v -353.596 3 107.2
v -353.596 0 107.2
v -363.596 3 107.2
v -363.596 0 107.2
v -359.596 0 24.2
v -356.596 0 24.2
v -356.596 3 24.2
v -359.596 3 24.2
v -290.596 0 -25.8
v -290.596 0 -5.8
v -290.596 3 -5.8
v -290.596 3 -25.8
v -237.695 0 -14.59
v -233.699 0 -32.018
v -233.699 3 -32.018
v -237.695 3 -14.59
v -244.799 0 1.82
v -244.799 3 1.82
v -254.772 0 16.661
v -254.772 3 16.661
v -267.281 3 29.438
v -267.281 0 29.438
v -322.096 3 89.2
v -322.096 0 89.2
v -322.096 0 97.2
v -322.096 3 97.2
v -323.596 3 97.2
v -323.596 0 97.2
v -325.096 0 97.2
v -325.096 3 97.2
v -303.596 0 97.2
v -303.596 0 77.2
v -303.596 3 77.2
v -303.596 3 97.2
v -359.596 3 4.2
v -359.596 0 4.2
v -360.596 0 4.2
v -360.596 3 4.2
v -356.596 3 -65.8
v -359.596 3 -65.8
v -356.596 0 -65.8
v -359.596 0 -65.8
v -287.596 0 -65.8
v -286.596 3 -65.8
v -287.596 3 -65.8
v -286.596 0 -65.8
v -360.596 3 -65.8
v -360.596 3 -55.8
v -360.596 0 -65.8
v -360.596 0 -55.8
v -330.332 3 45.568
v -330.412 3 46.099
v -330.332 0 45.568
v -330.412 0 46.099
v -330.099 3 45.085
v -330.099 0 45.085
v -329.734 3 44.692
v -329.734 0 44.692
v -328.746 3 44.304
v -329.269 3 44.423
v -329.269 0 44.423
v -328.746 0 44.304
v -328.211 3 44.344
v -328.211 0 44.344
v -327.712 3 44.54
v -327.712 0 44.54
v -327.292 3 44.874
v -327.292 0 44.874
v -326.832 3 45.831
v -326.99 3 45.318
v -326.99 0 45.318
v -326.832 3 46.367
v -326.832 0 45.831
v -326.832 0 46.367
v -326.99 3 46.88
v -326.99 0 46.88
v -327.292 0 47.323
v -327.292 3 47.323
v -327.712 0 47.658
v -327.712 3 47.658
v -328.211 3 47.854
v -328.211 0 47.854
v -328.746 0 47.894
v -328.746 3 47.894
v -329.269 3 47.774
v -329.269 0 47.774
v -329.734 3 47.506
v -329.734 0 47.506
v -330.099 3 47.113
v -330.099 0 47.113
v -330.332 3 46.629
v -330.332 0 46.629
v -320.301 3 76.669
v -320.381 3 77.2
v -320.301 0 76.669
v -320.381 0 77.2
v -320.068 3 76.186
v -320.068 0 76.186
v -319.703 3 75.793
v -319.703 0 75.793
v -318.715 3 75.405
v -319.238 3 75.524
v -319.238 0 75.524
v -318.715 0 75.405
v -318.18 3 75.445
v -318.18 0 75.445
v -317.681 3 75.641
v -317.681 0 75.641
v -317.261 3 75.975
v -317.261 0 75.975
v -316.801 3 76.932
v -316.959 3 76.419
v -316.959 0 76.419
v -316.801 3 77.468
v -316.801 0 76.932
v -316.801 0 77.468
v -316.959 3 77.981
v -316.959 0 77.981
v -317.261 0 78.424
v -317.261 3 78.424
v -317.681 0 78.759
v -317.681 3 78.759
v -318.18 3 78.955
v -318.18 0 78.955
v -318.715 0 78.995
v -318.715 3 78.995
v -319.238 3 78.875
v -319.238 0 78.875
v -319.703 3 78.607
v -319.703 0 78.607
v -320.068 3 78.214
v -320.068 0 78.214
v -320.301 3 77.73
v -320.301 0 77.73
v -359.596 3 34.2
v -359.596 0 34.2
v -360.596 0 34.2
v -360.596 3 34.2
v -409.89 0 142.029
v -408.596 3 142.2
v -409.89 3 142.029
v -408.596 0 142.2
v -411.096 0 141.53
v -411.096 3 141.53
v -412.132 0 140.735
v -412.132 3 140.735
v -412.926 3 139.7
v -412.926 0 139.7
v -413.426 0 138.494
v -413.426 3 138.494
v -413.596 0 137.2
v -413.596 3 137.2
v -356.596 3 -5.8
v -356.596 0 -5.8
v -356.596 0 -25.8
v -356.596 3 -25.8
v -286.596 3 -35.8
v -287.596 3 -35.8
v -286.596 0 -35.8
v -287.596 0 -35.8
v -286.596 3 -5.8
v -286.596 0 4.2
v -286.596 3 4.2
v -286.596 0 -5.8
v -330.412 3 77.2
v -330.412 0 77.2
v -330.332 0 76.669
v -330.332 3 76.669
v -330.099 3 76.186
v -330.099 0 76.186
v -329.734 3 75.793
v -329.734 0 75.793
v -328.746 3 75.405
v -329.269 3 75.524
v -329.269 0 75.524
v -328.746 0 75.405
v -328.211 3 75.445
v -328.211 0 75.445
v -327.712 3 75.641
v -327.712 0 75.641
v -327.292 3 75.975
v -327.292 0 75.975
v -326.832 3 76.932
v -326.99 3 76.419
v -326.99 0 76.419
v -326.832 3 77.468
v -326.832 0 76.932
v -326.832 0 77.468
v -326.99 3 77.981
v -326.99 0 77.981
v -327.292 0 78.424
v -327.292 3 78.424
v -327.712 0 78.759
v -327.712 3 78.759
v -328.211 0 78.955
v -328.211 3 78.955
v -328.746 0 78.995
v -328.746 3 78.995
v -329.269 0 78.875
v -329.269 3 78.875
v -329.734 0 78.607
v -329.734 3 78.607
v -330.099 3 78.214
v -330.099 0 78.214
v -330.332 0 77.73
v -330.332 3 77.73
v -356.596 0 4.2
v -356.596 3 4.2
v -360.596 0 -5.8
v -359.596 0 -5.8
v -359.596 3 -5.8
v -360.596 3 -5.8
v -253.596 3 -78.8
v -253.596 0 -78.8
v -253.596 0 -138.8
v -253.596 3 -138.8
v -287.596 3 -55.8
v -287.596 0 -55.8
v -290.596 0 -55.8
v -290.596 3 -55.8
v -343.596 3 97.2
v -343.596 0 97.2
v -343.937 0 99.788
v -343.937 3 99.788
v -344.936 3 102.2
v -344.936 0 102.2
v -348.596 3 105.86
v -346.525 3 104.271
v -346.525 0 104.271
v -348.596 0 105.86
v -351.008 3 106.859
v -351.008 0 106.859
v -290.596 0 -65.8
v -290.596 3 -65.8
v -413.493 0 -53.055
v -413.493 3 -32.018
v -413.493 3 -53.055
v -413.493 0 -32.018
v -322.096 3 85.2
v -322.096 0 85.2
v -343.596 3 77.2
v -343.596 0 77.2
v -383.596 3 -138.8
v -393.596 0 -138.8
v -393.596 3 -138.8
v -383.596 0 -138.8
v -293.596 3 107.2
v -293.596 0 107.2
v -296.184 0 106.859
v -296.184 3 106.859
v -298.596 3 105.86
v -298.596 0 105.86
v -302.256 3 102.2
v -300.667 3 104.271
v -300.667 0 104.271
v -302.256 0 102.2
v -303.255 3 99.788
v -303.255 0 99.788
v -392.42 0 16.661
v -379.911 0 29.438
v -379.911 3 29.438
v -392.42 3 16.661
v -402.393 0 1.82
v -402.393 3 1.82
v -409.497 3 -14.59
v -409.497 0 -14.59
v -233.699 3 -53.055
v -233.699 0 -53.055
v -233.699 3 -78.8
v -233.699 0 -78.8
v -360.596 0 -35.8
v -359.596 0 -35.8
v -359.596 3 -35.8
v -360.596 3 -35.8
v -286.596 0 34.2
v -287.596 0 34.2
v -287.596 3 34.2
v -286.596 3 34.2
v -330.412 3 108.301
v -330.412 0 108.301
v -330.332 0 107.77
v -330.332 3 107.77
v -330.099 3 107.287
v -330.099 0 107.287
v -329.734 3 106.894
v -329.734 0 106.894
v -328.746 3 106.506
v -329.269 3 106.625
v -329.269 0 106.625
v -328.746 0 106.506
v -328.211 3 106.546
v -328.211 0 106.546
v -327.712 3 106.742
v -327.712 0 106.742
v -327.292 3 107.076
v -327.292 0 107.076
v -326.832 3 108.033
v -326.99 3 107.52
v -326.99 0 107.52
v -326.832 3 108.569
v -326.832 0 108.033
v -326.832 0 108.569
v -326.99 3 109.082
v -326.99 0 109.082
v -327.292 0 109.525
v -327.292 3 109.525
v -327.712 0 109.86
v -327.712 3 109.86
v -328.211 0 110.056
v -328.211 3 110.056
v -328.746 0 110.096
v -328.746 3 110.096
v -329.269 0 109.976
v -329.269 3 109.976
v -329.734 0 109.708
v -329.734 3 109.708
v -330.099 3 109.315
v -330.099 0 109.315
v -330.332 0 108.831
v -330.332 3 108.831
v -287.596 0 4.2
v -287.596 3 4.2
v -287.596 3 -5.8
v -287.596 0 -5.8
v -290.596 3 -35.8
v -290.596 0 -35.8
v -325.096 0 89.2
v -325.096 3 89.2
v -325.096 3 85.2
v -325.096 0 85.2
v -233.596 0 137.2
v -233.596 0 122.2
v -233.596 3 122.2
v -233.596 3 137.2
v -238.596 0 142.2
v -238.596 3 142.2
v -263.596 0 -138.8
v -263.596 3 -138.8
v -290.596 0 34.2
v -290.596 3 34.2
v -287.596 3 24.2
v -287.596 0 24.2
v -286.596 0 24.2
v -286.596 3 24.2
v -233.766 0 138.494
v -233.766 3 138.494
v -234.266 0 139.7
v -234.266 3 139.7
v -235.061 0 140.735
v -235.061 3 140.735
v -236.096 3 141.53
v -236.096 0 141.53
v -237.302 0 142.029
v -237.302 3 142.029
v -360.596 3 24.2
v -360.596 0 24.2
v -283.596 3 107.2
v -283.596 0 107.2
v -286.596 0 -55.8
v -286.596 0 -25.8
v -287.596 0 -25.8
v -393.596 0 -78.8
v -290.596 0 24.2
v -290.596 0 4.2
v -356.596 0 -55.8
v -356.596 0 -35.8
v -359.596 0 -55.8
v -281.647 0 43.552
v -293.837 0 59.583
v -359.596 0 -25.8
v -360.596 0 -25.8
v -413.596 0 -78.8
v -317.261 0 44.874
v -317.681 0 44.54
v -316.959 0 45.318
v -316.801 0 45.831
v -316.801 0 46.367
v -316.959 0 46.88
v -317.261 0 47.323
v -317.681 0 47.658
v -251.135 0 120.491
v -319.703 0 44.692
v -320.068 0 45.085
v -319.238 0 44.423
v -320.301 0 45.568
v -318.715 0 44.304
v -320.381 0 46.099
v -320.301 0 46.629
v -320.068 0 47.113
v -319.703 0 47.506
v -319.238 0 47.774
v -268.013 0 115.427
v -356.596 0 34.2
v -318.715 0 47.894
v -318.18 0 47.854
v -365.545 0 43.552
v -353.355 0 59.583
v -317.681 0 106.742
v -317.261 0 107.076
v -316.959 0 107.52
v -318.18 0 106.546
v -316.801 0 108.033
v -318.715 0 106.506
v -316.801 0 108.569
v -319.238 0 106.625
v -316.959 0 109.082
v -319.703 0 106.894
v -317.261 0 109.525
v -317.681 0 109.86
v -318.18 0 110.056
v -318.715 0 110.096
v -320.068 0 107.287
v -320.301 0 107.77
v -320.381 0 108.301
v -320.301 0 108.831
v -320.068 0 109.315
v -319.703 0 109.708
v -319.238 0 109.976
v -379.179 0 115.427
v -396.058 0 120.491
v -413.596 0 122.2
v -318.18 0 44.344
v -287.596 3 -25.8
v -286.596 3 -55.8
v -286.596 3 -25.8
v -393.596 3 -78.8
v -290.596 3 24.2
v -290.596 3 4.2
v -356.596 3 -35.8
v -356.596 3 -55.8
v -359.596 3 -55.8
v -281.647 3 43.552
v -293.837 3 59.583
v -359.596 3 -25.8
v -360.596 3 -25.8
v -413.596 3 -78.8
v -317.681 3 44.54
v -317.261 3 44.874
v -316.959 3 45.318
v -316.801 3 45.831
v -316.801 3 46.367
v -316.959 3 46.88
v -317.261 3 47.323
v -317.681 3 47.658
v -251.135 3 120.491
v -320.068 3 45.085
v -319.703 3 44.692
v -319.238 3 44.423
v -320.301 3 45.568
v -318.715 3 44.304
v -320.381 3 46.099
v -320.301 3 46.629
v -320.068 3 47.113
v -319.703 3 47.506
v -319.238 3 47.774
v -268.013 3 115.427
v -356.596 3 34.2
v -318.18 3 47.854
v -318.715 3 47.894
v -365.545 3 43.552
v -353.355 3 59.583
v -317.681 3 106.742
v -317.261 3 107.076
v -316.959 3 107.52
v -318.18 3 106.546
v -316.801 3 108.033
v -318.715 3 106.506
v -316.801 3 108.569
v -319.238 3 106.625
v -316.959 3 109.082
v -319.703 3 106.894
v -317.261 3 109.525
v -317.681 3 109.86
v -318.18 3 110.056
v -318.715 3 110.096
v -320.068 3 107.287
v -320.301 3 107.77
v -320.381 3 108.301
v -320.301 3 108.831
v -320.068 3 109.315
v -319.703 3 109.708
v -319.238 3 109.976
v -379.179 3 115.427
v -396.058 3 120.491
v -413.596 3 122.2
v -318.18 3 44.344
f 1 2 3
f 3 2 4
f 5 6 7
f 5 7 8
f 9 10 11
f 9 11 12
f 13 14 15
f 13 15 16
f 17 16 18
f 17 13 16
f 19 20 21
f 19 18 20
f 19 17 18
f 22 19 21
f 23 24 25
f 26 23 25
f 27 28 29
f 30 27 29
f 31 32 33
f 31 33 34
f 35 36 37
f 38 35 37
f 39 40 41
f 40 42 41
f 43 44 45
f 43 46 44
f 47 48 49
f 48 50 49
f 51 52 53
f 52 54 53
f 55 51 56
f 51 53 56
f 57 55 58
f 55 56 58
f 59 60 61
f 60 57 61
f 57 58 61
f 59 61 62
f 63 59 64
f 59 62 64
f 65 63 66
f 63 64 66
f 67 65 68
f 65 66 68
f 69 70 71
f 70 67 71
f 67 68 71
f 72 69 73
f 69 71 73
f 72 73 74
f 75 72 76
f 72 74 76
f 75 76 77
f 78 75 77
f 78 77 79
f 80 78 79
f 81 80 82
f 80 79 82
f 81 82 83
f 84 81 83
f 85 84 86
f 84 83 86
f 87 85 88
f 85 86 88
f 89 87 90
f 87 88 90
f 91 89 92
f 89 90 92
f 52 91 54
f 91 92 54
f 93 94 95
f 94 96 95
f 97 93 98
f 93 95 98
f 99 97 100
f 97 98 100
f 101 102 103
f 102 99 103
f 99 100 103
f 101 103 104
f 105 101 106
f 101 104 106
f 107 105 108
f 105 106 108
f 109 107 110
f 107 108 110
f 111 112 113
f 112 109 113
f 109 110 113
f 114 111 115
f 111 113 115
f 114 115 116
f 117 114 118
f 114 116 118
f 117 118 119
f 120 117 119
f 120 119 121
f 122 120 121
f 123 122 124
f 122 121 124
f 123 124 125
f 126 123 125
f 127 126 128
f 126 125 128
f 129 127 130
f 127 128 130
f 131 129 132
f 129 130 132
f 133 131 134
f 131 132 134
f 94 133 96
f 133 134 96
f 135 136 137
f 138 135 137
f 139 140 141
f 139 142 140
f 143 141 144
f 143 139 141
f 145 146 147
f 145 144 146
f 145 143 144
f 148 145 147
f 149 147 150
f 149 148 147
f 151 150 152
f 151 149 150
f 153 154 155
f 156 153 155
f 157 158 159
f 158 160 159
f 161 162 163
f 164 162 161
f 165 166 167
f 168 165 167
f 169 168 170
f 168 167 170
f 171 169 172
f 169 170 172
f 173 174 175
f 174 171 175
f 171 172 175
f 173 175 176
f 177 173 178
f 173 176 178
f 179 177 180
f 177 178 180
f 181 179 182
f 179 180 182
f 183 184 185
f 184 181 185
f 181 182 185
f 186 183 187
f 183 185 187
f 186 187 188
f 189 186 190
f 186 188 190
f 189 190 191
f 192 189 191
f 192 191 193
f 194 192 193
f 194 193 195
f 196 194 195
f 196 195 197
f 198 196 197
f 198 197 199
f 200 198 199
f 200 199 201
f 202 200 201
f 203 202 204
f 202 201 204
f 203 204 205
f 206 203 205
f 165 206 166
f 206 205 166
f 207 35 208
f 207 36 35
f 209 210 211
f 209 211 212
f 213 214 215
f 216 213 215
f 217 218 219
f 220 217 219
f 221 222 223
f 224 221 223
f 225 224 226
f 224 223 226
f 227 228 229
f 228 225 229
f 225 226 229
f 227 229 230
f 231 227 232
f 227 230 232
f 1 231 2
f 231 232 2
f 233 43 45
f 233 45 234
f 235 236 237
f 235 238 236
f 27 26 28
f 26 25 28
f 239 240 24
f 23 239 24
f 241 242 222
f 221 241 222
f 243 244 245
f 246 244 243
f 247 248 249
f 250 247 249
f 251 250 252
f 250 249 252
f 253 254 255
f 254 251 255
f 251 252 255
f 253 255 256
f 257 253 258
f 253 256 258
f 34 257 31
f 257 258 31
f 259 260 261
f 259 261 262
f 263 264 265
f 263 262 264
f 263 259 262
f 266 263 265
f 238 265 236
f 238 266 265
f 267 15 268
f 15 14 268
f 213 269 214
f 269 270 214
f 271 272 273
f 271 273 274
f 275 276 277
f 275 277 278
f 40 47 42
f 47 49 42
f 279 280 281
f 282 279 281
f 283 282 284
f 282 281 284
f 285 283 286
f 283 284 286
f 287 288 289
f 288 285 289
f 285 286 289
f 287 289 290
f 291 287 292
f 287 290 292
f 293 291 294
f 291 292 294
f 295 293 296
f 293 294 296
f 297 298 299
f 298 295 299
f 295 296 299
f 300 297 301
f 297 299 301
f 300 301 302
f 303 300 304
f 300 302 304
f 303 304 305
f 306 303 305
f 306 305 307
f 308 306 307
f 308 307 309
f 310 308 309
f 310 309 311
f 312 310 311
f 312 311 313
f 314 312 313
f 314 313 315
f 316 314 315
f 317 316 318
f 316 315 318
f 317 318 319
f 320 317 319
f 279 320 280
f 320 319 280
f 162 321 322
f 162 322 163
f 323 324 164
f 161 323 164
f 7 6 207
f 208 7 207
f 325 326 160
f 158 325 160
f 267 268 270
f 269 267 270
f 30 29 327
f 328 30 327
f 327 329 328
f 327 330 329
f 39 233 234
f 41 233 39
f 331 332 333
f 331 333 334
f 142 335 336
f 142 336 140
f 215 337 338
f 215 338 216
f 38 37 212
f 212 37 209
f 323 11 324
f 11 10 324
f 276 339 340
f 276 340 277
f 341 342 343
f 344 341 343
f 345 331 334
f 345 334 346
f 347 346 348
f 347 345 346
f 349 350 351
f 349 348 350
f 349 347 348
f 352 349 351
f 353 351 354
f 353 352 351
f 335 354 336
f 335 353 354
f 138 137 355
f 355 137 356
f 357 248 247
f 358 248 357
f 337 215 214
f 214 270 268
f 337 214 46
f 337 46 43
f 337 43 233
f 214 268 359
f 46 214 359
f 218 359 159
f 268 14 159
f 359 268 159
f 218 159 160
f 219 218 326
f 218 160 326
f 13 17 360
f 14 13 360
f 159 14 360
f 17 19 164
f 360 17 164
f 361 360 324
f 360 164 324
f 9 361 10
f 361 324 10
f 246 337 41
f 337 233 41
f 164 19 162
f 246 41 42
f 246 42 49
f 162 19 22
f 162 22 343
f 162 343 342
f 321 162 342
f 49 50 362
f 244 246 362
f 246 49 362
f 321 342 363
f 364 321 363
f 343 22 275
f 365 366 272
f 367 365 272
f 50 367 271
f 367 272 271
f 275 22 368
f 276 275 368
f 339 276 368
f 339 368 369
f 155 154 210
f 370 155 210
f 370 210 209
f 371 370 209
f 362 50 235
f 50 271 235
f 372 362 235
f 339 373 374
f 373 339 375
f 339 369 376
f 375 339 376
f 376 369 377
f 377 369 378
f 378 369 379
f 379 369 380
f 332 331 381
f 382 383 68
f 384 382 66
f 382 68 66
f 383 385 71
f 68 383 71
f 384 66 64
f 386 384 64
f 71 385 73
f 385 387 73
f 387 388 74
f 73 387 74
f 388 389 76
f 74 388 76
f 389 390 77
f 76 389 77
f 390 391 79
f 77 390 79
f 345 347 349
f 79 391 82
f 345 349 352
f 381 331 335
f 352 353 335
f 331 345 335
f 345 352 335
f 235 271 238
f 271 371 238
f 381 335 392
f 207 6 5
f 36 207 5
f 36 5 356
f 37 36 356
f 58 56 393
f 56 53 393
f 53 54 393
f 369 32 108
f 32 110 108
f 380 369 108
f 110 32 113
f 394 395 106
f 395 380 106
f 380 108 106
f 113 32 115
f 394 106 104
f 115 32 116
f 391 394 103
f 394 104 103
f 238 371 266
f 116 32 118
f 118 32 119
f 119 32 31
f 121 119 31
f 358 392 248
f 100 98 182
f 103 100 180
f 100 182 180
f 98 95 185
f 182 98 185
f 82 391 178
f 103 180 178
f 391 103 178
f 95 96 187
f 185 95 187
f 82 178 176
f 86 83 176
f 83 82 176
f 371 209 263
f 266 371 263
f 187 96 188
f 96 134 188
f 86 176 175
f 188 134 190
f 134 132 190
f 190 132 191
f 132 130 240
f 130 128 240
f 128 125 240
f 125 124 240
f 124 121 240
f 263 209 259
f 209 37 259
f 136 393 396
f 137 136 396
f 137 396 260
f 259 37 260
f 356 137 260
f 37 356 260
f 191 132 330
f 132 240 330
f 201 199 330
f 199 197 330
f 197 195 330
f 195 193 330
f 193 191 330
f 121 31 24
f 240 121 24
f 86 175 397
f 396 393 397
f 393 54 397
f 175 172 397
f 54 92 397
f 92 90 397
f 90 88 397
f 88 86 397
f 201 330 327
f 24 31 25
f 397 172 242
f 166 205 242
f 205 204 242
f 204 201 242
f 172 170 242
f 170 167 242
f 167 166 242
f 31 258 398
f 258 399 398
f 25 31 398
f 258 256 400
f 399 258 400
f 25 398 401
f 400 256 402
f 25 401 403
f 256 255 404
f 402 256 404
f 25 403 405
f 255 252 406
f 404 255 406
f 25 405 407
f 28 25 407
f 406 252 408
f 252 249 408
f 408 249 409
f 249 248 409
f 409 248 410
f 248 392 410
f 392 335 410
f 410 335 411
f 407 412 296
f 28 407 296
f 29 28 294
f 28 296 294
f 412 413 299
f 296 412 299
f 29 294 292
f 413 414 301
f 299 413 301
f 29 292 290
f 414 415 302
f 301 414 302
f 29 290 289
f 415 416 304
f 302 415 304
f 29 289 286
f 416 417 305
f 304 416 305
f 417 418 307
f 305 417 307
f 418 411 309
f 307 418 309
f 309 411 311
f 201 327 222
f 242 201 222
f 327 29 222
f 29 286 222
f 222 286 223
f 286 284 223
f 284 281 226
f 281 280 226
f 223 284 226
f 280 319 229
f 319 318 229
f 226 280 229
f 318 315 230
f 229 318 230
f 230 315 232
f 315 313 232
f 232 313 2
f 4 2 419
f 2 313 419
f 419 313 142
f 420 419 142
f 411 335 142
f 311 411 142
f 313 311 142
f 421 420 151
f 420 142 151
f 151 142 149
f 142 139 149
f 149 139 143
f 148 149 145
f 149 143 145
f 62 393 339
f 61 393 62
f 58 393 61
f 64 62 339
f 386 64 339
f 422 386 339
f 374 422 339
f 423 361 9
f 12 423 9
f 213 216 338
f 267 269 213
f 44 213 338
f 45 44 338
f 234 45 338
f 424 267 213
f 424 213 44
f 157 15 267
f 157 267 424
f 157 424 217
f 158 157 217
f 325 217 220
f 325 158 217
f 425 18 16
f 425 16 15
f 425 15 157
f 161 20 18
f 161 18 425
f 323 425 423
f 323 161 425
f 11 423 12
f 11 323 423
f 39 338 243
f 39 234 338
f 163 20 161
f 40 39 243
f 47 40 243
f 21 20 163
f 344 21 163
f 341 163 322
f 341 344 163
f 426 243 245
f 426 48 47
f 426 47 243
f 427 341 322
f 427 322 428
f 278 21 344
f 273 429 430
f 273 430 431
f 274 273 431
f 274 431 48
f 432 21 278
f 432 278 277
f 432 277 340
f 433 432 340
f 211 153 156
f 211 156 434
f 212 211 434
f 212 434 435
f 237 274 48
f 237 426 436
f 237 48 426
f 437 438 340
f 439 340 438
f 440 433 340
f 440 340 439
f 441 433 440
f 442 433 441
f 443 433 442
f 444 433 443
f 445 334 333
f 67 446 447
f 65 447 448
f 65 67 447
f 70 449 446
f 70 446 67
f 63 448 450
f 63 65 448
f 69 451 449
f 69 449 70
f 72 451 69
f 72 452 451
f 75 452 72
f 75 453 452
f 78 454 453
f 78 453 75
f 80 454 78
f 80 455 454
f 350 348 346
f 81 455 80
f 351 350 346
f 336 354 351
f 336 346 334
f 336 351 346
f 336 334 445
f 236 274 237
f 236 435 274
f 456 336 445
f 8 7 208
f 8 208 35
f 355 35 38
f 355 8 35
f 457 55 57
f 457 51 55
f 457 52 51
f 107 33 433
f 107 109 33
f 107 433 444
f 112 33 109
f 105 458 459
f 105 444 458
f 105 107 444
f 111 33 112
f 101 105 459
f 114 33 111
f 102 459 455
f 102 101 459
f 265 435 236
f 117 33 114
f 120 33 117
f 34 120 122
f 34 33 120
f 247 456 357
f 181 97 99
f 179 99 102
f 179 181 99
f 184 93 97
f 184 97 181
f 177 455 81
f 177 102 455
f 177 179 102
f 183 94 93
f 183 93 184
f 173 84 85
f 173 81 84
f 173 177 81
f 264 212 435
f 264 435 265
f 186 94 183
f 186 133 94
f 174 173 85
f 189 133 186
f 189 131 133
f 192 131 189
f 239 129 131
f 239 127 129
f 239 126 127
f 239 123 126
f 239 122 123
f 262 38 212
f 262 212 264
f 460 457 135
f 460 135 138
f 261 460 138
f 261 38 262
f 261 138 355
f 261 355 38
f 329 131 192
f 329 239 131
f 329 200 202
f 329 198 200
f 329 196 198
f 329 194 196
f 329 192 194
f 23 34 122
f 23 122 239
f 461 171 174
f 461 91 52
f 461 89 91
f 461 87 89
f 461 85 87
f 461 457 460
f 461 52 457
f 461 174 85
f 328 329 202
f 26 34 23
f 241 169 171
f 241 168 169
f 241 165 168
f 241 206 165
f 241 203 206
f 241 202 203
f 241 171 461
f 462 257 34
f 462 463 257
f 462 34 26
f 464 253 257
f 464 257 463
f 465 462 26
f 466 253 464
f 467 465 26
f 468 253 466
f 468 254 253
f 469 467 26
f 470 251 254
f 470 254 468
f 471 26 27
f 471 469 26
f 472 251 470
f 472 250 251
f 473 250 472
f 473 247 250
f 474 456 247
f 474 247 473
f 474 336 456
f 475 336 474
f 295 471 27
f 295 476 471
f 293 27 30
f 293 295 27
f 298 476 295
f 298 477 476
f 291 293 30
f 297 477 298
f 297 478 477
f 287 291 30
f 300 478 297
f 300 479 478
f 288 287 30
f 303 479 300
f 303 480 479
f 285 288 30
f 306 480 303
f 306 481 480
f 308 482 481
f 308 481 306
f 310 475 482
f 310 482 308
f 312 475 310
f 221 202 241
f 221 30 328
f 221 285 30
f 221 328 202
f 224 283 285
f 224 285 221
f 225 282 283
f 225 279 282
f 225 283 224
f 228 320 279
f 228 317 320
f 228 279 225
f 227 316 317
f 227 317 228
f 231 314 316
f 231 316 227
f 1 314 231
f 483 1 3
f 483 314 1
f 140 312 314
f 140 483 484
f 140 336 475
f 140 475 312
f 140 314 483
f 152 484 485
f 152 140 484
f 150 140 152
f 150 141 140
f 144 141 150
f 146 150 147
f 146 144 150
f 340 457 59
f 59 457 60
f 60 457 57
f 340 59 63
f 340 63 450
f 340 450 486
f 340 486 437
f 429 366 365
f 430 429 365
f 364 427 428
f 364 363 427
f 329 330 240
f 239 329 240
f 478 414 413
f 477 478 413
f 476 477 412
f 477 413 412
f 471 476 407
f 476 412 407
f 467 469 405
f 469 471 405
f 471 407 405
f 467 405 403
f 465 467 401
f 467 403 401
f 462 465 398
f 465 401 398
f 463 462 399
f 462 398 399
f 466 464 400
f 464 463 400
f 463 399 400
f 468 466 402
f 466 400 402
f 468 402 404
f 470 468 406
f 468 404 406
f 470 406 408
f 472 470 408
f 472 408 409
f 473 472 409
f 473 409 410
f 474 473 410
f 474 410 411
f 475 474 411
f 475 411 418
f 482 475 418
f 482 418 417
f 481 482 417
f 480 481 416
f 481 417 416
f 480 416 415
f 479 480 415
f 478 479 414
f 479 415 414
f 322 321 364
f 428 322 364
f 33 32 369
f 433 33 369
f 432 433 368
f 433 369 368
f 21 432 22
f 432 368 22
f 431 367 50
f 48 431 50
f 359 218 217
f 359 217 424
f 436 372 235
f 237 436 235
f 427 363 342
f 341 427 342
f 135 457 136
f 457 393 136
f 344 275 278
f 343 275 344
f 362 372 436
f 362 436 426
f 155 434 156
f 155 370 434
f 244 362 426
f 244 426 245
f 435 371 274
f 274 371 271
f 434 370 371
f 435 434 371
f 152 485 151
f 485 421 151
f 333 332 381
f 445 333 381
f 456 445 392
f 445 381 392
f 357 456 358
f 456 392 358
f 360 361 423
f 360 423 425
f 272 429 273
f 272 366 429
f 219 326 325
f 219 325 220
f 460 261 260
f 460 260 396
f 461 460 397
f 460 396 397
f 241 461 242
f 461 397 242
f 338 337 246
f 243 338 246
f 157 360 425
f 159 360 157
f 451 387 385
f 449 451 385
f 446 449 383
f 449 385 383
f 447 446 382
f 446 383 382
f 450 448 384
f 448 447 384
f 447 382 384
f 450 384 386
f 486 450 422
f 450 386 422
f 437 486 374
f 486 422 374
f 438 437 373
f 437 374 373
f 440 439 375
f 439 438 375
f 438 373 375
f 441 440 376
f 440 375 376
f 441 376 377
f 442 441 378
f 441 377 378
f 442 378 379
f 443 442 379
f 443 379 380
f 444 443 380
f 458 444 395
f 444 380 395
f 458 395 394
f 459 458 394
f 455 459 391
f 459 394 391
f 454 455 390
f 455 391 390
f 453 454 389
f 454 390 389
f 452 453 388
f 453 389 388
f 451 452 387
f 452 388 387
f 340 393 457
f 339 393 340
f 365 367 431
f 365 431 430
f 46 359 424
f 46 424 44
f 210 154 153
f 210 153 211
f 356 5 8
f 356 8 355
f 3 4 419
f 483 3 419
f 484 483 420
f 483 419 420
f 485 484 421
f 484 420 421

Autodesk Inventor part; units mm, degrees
ref_plane "YZ Plane" through (0, 0, 0) normal (1, 0, 0) x (0, 1, 0)
ref_plane "XZ Plane" through (0, 0, 0) normal (0, 1, 0) x (-1, 0, 0)
ref_plane "XY Plane" through (0, 0, 0) normal (0, 0, 1) x (1, 0, 0)
sketch "草圖1" plane through (0, 0, 0) normal (0, 1, 0) x (-1, 0, 0)
  line L0 (413.5961, 122.1998) -> (413.5961, 137.1998)
  arc A0 (413.5961, 137.1998) -> (408.5961, 142.1998) centre (408.5961, 137.1998) ccw
  line L1 (233.5961, 122.1998) -> (233.5961, 137.1998)
  line L2 (238.5961, 142.1998) -> (408.5961, 142.1998)
  line L3 (303.5961, 77.1998) -> (303.5961, 97.1998)
  arc A1 (303.5961, 97.1998) -> (293.5961, 107.1998) centre (293.5961, 97.1998) ccw
  line L4 (293.5961, 107.1998) -> (283.5961, 107.1998)
  line L5 (343.5961, 77.1998) -> (343.5961, 97.1998)
  arc A2 (353.5961, 107.1998) -> (343.5961, 97.1998) centre (353.5961, 97.1998) ccw
  line L6 (353.5961, 107.1998) -> (363.5961, 107.1998)
  line L7 (233.5961, 137.1998) -> (233.5961, 122.1998)
  arc A3 (238.5961, 142.1998) -> (233.5961, 137.1998) centre (238.5961, 137.1998) ccw
  arc A4 (283.5961, 107.1998) -> (233.5961, 122.1998) centre (233.5961, 31.3665) ccw
  arc A5 (413.5961, 122.1998) -> (363.5961, 107.1998) centre (413.5961, 31.3665) ccw
  line L8 (356.5961, 34.1998) -> (290.5961, 34.1998)
  line L9 (290.5961, 24.1998) -> (290.5961, 4.1998)
  line L10 (290.5961, -5.8002) -> (290.5961, -25.8002)
  line L11 (290.5961, -35.8002) -> (290.5961, -55.8002)
  line L12 (290.5961, -65.8002) -> (356.5961, -65.8002)
  line L13 (263.5961, -138.8002) -> (383.5961, -138.8002)
  line L14 (233.6991, -53.0551) -> (233.6991, -78.8002)
  line L15 (413.5961, -78.8002) -> (413.4932, -53.0551)
  arc A6 (267.2809, 29.4379) -> (303.5961, 77.1998) centre (176.7496, 135.9594) ccw
  arc A7 (267.2809, 29.4379) -> (233.6991, -32.0184) centre (330.5999, -45.0649) ccw
  arc A8 (343.5961, 77.1998) -> (379.9114, 29.4379) centre (470.4427, 135.9594) ccw
  arc A9 (413.4932, -32.0184) -> (379.9114, 29.4379) centre (316.5923, -45.0649) ccw
  line L16 (413.4932, -32.0184) -> (413.4932, -53.0551)
  line L17 (233.6991, -32.0184) -> (233.6991, -53.0551)
  line L18 (290.5961, -55.8002) -> (290.5961, -35.8002)
  line L19 (290.5961, -25.8002) -> (290.5961, -5.8002)
  line L20 (290.5961, 4.1998) -> (290.5961, 24.1998)
  line L21 (290.5961, 34.1998) -> (287.5961, 34.1998)
  line L22 (287.5961, -65.8002) -> (290.5961, -65.8002)
  line L23 (287.5961, 4.1998) -> (290.5961, 4.1998)
  line L24 (290.5961, 4.1998) -> (290.5961, 24.1998)
  line L25 (290.5961, 24.1998) -> (287.5961, 24.1998)
  line L26 (290.5961, -5.8002) -> (287.5961, -5.8002)
  line L27 (287.5961, -25.8002) -> (290.5961, -25.8002)
  line L28 (290.5961, -25.8002) -> (290.5961, -5.8002)
  line L29 (290.5961, -35.8002) -> (287.5961, -35.8002)
  line L30 (287.5961, -55.8002) -> (290.5961, -55.8002)
  line L31 (290.5961, -55.8002) -> (290.5961, -35.8002)
  line L32 (287.5961, 34.1998) -> (286.5961, 34.1998)
  line L33 (286.5961, 34.1998) -> (286.5961, 24.1998)
  line L34 (286.5961, 4.1998) -> (286.5961, -5.8002)
  line L35 (286.5961, -25.8002) -> (286.5961, -35.8002)
  line L36 (286.5961, -55.8002) -> (286.5961, -65.8002)
  line L37 (286.5961, -65.8002) -> (287.5961, -65.8002)
  line L38 (287.5961, 24.1998) -> (286.5961, 24.1998)
  line L39 (287.5961, 4.1998) -> (286.5961, 4.1998)
  line L40 (287.5961, -5.8002) -> (286.5961, -5.8002)
  line L41 (287.5961, -25.8002) -> (286.5961, -25.8002)
  line L42 (287.5961, -35.8002) -> (286.5961, -35.8002)
  line L43 (287.5961, -55.8002) -> (286.5961, -55.8002)
  line L44 (356.5961, 24.1998) -> (356.5961, 4.1998)
  line L45 (356.5961, -5.8002) -> (356.5961, -25.8002)
  line L46 (356.5961, -35.8002) -> (356.5961, -55.8002)
  line L47 (356.5961, -55.8002) -> (356.5961, -35.8002)
  line L48 (356.5961, -25.8002) -> (356.5961, -5.8002)
  line L49 (356.5961, 4.1998) -> (356.5961, 24.1998)
  line L50 (356.5961, 34.1998) -> (359.5961, 34.1998)
  line L51 (359.5961, -65.8002) -> (356.5961, -65.8002)
  line L52 (359.5961, 4.1998) -> (356.5961, 4.1998)
  line L53 (356.5961, 4.1998) -> (356.5961, 24.1998)
  line L54 (356.5961, 24.1998) -> (359.5961, 24.1998)
  line L55 (356.5961, -5.8002) -> (359.5961, -5.8002)
  line L56 (359.5961, -25.8002) -> (356.5961, -25.8002)
  line L57 (356.5961, -25.8002) -> (356.5961, -5.8002)
  line L58 (356.5961, -35.8002) -> (359.5961, -35.8002)
  line L59 (359.5961, -55.8002) -> (356.5961, -55.8002)
  line L60 (356.5961, -55.8002) -> (356.5961, -35.8002)
  line L61 (359.5961, 34.1998) -> (360.5961, 34.1998)
  line L62 (360.5961, 34.1998) -> (360.5961, 24.1998)
  line L63 (360.5961, 4.1998) -> (360.5961, -5.8002)
  line L64 (360.5961, -25.8002) -> (360.5961, -35.8002)
  line L65 (360.5961, -55.8002) -> (360.5961, -65.8002)
  line L66 (360.5961, -65.8002) -> (359.5961, -65.8002)
  line L67 (359.5961, 24.1998) -> (360.5961, 24.1998)
  line L68 (359.5961, 4.1998) -> (360.5961, 4.1998)
  line L69 (359.5961, -5.8002) -> (360.5961, -5.8002)
  line L70 (359.5961, -25.8002) -> (360.5961, -25.8002)
  line L71 (359.5961, -35.8002) -> (360.5961, -35.8002)
  line L72 (359.5961, -55.8002) -> (360.5961, -55.8002)
  line L73 (323.5961, 97.1998) -> (325.0961, 97.1998)
  line L74 (325.0961, 97.1998) -> (325.0961, 89.1998)
  line L75 (325.0961, 85.1998) -> (322.0961, 85.1998)
  line L76 (322.0961, 89.1998) -> (322.0961, 97.1998)
  line L77 (322.0961, 97.1998) -> (323.5961, 97.1998)
  line L78 (322.0961, 85.1998) -> (322.0961, 89.1998)
  line L79 (325.0961, 85.1998) -> (325.0961, 89.1998)
  line L80 (323.5961, 77.1998) -> (408.5961, 77.1998) construction
  line L81 (323.5961, 77.1998) -> (238.5961, 77.1998) construction
  line L82 (408.5961, 107.1998) -> (393.5961, 107.1998) construction
  line L83 (393.5961, 107.1998) -> (393.5961, 47.1998) construction
  line L84 (393.5961, 47.1998) -> (423.5961, 47.1998) construction
  line L85 (423.5961, 47.1998) -> (423.5961, 107.1998) construction
  line L86 (423.5961, 107.1998) -> (408.5961, 107.1998) construction
  line L87 (238.5961, 107.1998) -> (253.5961, 107.1998) construction
  line L88 (253.5961, 107.1998) -> (253.5961, 47.1998) construction
  line L89 (253.5961, 47.1998) -> (223.5961, 47.1998) construction
  line L90 (223.5961, 47.1998) -> (223.5961, 107.1998) construction
  line L91 (223.5961, 107.1998) -> (238.5961, 107.1998) construction
  line L92 (253.5961, 77.1998) -> (257.5961, 77.1998) construction
  line L93 (257.5961, 77.1998) -> (257.5961, 82.1998) construction
  line L94 (393.5961, 77.1998) -> (389.5961, 77.1998) construction
  line L95 (389.5961, 77.1998) -> (389.5961, 82.1998) construction
  line L96 (257.5961, 77.1998) -> (261.5961, 77.1998) construction
  line L97 (389.5961, 77.1998) -> (385.5961, 77.1998)
  line L98 (261.5961, 77.1998) -> (271.5961, 77.1998)
  line L99 (271.5961, 77.1998) -> (318.5808, 60.0988) construction
  line L100 (271.5961, 77.1998) -> (318.5808, 94.3008) construction
  line L101 (385.5961, 77.1998) -> (375.5961, 77.1998)
  line L102 (375.5961, 77.1998) -> (328.6115, 94.3008) construction
  line L103 (375.5961, 77.1998) -> (328.6115, 60.0988) construction
  line L104 (261.5961, 77.1998) -> (274.2452, 39.2525) construction
  line L105 (274.2452, 39.2525) -> (372.947, 39.2525) construction
  line L106 (372.947, 39.2525) -> (385.5961, 77.1998) construction
  line L107 (323.5961, -108.8002) -> (408.5961, -108.8002) construction
  line L108 (323.5961, -108.8002) -> (238.5961, -108.8002) construction
  line L109 (423.5961, -108.8002) -> (423.5961, -78.8002) construction
  line L110 (423.5961, -78.8002) -> (393.5961, -78.8002)
  line L111 (393.5961, -78.8002) -> (393.5961, -138.8002)
  line L112 (393.5961, -138.8002) -> (423.5961, -138.8002) construction
  line L113 (423.5961, -138.8002) -> (423.5961, -108.8002) construction
  line L114 (223.5961, -108.8002) -> (223.5961, -78.8002) construction
  line L115 (223.5961, -78.8002) -> (253.5961, -78.8002)
  line L116 (253.5961, -78.8002) -> (253.5961, -138.8002)
  line L117 (253.5961, -138.8002) -> (223.5961, -138.8002) construction
  line L118 (223.5961, -138.8002) -> (223.5961, -108.8002) construction
  line L119 (393.5961, -138.8002) -> (383.5961, -138.8002)
  line L120 (263.5961, -138.8002) -> (253.5961, -138.8002)
  line L121 (318.5808, 94.3008) -> (318.5808, 108.3008) construction
  line L122 (328.6115, 94.3008) -> (328.6115, 108.3008) construction
  line L123 (328.6115, 60.0988) -> (328.6115, 46.0988) construction
  line L124 (318.5808, 60.0988) -> (318.5808, 46.0988) construction
  circle A10 centre (328.6115, 108.3008) radius 1.8
  circle A11 centre (318.5808, 108.3008) radius 1.8
  circle A12 centre (328.6115, 46.0988) radius 1.8
  circle A13 centre (318.5808, 46.0988) radius 1.8
  circle A14 centre (318.5808, 77.1998) radius 1.8
  circle A15 centre (328.6115, 77.1998) radius 1.8
  point P0 (0, 0)
  dimension "d0" = 14
  dimension "d1" = 14
  dimension "d2" = 14
  dimension "d3" = 3.6
  dimension "d4" = 3.6
  dimension "d5" = 3.6
  dimension "d6" = 3.6
  dimension "d7" = 3.6
  dimension "d8" = 3.6
extrude "擠出1" add sketch "草圖1" along normal blind 3
ref_plane "Work Plane1" through (-323.5961, 0, 97.1998) normal (1, 0, 0) x (0, 0, -1)
properties part number "底盤新"
